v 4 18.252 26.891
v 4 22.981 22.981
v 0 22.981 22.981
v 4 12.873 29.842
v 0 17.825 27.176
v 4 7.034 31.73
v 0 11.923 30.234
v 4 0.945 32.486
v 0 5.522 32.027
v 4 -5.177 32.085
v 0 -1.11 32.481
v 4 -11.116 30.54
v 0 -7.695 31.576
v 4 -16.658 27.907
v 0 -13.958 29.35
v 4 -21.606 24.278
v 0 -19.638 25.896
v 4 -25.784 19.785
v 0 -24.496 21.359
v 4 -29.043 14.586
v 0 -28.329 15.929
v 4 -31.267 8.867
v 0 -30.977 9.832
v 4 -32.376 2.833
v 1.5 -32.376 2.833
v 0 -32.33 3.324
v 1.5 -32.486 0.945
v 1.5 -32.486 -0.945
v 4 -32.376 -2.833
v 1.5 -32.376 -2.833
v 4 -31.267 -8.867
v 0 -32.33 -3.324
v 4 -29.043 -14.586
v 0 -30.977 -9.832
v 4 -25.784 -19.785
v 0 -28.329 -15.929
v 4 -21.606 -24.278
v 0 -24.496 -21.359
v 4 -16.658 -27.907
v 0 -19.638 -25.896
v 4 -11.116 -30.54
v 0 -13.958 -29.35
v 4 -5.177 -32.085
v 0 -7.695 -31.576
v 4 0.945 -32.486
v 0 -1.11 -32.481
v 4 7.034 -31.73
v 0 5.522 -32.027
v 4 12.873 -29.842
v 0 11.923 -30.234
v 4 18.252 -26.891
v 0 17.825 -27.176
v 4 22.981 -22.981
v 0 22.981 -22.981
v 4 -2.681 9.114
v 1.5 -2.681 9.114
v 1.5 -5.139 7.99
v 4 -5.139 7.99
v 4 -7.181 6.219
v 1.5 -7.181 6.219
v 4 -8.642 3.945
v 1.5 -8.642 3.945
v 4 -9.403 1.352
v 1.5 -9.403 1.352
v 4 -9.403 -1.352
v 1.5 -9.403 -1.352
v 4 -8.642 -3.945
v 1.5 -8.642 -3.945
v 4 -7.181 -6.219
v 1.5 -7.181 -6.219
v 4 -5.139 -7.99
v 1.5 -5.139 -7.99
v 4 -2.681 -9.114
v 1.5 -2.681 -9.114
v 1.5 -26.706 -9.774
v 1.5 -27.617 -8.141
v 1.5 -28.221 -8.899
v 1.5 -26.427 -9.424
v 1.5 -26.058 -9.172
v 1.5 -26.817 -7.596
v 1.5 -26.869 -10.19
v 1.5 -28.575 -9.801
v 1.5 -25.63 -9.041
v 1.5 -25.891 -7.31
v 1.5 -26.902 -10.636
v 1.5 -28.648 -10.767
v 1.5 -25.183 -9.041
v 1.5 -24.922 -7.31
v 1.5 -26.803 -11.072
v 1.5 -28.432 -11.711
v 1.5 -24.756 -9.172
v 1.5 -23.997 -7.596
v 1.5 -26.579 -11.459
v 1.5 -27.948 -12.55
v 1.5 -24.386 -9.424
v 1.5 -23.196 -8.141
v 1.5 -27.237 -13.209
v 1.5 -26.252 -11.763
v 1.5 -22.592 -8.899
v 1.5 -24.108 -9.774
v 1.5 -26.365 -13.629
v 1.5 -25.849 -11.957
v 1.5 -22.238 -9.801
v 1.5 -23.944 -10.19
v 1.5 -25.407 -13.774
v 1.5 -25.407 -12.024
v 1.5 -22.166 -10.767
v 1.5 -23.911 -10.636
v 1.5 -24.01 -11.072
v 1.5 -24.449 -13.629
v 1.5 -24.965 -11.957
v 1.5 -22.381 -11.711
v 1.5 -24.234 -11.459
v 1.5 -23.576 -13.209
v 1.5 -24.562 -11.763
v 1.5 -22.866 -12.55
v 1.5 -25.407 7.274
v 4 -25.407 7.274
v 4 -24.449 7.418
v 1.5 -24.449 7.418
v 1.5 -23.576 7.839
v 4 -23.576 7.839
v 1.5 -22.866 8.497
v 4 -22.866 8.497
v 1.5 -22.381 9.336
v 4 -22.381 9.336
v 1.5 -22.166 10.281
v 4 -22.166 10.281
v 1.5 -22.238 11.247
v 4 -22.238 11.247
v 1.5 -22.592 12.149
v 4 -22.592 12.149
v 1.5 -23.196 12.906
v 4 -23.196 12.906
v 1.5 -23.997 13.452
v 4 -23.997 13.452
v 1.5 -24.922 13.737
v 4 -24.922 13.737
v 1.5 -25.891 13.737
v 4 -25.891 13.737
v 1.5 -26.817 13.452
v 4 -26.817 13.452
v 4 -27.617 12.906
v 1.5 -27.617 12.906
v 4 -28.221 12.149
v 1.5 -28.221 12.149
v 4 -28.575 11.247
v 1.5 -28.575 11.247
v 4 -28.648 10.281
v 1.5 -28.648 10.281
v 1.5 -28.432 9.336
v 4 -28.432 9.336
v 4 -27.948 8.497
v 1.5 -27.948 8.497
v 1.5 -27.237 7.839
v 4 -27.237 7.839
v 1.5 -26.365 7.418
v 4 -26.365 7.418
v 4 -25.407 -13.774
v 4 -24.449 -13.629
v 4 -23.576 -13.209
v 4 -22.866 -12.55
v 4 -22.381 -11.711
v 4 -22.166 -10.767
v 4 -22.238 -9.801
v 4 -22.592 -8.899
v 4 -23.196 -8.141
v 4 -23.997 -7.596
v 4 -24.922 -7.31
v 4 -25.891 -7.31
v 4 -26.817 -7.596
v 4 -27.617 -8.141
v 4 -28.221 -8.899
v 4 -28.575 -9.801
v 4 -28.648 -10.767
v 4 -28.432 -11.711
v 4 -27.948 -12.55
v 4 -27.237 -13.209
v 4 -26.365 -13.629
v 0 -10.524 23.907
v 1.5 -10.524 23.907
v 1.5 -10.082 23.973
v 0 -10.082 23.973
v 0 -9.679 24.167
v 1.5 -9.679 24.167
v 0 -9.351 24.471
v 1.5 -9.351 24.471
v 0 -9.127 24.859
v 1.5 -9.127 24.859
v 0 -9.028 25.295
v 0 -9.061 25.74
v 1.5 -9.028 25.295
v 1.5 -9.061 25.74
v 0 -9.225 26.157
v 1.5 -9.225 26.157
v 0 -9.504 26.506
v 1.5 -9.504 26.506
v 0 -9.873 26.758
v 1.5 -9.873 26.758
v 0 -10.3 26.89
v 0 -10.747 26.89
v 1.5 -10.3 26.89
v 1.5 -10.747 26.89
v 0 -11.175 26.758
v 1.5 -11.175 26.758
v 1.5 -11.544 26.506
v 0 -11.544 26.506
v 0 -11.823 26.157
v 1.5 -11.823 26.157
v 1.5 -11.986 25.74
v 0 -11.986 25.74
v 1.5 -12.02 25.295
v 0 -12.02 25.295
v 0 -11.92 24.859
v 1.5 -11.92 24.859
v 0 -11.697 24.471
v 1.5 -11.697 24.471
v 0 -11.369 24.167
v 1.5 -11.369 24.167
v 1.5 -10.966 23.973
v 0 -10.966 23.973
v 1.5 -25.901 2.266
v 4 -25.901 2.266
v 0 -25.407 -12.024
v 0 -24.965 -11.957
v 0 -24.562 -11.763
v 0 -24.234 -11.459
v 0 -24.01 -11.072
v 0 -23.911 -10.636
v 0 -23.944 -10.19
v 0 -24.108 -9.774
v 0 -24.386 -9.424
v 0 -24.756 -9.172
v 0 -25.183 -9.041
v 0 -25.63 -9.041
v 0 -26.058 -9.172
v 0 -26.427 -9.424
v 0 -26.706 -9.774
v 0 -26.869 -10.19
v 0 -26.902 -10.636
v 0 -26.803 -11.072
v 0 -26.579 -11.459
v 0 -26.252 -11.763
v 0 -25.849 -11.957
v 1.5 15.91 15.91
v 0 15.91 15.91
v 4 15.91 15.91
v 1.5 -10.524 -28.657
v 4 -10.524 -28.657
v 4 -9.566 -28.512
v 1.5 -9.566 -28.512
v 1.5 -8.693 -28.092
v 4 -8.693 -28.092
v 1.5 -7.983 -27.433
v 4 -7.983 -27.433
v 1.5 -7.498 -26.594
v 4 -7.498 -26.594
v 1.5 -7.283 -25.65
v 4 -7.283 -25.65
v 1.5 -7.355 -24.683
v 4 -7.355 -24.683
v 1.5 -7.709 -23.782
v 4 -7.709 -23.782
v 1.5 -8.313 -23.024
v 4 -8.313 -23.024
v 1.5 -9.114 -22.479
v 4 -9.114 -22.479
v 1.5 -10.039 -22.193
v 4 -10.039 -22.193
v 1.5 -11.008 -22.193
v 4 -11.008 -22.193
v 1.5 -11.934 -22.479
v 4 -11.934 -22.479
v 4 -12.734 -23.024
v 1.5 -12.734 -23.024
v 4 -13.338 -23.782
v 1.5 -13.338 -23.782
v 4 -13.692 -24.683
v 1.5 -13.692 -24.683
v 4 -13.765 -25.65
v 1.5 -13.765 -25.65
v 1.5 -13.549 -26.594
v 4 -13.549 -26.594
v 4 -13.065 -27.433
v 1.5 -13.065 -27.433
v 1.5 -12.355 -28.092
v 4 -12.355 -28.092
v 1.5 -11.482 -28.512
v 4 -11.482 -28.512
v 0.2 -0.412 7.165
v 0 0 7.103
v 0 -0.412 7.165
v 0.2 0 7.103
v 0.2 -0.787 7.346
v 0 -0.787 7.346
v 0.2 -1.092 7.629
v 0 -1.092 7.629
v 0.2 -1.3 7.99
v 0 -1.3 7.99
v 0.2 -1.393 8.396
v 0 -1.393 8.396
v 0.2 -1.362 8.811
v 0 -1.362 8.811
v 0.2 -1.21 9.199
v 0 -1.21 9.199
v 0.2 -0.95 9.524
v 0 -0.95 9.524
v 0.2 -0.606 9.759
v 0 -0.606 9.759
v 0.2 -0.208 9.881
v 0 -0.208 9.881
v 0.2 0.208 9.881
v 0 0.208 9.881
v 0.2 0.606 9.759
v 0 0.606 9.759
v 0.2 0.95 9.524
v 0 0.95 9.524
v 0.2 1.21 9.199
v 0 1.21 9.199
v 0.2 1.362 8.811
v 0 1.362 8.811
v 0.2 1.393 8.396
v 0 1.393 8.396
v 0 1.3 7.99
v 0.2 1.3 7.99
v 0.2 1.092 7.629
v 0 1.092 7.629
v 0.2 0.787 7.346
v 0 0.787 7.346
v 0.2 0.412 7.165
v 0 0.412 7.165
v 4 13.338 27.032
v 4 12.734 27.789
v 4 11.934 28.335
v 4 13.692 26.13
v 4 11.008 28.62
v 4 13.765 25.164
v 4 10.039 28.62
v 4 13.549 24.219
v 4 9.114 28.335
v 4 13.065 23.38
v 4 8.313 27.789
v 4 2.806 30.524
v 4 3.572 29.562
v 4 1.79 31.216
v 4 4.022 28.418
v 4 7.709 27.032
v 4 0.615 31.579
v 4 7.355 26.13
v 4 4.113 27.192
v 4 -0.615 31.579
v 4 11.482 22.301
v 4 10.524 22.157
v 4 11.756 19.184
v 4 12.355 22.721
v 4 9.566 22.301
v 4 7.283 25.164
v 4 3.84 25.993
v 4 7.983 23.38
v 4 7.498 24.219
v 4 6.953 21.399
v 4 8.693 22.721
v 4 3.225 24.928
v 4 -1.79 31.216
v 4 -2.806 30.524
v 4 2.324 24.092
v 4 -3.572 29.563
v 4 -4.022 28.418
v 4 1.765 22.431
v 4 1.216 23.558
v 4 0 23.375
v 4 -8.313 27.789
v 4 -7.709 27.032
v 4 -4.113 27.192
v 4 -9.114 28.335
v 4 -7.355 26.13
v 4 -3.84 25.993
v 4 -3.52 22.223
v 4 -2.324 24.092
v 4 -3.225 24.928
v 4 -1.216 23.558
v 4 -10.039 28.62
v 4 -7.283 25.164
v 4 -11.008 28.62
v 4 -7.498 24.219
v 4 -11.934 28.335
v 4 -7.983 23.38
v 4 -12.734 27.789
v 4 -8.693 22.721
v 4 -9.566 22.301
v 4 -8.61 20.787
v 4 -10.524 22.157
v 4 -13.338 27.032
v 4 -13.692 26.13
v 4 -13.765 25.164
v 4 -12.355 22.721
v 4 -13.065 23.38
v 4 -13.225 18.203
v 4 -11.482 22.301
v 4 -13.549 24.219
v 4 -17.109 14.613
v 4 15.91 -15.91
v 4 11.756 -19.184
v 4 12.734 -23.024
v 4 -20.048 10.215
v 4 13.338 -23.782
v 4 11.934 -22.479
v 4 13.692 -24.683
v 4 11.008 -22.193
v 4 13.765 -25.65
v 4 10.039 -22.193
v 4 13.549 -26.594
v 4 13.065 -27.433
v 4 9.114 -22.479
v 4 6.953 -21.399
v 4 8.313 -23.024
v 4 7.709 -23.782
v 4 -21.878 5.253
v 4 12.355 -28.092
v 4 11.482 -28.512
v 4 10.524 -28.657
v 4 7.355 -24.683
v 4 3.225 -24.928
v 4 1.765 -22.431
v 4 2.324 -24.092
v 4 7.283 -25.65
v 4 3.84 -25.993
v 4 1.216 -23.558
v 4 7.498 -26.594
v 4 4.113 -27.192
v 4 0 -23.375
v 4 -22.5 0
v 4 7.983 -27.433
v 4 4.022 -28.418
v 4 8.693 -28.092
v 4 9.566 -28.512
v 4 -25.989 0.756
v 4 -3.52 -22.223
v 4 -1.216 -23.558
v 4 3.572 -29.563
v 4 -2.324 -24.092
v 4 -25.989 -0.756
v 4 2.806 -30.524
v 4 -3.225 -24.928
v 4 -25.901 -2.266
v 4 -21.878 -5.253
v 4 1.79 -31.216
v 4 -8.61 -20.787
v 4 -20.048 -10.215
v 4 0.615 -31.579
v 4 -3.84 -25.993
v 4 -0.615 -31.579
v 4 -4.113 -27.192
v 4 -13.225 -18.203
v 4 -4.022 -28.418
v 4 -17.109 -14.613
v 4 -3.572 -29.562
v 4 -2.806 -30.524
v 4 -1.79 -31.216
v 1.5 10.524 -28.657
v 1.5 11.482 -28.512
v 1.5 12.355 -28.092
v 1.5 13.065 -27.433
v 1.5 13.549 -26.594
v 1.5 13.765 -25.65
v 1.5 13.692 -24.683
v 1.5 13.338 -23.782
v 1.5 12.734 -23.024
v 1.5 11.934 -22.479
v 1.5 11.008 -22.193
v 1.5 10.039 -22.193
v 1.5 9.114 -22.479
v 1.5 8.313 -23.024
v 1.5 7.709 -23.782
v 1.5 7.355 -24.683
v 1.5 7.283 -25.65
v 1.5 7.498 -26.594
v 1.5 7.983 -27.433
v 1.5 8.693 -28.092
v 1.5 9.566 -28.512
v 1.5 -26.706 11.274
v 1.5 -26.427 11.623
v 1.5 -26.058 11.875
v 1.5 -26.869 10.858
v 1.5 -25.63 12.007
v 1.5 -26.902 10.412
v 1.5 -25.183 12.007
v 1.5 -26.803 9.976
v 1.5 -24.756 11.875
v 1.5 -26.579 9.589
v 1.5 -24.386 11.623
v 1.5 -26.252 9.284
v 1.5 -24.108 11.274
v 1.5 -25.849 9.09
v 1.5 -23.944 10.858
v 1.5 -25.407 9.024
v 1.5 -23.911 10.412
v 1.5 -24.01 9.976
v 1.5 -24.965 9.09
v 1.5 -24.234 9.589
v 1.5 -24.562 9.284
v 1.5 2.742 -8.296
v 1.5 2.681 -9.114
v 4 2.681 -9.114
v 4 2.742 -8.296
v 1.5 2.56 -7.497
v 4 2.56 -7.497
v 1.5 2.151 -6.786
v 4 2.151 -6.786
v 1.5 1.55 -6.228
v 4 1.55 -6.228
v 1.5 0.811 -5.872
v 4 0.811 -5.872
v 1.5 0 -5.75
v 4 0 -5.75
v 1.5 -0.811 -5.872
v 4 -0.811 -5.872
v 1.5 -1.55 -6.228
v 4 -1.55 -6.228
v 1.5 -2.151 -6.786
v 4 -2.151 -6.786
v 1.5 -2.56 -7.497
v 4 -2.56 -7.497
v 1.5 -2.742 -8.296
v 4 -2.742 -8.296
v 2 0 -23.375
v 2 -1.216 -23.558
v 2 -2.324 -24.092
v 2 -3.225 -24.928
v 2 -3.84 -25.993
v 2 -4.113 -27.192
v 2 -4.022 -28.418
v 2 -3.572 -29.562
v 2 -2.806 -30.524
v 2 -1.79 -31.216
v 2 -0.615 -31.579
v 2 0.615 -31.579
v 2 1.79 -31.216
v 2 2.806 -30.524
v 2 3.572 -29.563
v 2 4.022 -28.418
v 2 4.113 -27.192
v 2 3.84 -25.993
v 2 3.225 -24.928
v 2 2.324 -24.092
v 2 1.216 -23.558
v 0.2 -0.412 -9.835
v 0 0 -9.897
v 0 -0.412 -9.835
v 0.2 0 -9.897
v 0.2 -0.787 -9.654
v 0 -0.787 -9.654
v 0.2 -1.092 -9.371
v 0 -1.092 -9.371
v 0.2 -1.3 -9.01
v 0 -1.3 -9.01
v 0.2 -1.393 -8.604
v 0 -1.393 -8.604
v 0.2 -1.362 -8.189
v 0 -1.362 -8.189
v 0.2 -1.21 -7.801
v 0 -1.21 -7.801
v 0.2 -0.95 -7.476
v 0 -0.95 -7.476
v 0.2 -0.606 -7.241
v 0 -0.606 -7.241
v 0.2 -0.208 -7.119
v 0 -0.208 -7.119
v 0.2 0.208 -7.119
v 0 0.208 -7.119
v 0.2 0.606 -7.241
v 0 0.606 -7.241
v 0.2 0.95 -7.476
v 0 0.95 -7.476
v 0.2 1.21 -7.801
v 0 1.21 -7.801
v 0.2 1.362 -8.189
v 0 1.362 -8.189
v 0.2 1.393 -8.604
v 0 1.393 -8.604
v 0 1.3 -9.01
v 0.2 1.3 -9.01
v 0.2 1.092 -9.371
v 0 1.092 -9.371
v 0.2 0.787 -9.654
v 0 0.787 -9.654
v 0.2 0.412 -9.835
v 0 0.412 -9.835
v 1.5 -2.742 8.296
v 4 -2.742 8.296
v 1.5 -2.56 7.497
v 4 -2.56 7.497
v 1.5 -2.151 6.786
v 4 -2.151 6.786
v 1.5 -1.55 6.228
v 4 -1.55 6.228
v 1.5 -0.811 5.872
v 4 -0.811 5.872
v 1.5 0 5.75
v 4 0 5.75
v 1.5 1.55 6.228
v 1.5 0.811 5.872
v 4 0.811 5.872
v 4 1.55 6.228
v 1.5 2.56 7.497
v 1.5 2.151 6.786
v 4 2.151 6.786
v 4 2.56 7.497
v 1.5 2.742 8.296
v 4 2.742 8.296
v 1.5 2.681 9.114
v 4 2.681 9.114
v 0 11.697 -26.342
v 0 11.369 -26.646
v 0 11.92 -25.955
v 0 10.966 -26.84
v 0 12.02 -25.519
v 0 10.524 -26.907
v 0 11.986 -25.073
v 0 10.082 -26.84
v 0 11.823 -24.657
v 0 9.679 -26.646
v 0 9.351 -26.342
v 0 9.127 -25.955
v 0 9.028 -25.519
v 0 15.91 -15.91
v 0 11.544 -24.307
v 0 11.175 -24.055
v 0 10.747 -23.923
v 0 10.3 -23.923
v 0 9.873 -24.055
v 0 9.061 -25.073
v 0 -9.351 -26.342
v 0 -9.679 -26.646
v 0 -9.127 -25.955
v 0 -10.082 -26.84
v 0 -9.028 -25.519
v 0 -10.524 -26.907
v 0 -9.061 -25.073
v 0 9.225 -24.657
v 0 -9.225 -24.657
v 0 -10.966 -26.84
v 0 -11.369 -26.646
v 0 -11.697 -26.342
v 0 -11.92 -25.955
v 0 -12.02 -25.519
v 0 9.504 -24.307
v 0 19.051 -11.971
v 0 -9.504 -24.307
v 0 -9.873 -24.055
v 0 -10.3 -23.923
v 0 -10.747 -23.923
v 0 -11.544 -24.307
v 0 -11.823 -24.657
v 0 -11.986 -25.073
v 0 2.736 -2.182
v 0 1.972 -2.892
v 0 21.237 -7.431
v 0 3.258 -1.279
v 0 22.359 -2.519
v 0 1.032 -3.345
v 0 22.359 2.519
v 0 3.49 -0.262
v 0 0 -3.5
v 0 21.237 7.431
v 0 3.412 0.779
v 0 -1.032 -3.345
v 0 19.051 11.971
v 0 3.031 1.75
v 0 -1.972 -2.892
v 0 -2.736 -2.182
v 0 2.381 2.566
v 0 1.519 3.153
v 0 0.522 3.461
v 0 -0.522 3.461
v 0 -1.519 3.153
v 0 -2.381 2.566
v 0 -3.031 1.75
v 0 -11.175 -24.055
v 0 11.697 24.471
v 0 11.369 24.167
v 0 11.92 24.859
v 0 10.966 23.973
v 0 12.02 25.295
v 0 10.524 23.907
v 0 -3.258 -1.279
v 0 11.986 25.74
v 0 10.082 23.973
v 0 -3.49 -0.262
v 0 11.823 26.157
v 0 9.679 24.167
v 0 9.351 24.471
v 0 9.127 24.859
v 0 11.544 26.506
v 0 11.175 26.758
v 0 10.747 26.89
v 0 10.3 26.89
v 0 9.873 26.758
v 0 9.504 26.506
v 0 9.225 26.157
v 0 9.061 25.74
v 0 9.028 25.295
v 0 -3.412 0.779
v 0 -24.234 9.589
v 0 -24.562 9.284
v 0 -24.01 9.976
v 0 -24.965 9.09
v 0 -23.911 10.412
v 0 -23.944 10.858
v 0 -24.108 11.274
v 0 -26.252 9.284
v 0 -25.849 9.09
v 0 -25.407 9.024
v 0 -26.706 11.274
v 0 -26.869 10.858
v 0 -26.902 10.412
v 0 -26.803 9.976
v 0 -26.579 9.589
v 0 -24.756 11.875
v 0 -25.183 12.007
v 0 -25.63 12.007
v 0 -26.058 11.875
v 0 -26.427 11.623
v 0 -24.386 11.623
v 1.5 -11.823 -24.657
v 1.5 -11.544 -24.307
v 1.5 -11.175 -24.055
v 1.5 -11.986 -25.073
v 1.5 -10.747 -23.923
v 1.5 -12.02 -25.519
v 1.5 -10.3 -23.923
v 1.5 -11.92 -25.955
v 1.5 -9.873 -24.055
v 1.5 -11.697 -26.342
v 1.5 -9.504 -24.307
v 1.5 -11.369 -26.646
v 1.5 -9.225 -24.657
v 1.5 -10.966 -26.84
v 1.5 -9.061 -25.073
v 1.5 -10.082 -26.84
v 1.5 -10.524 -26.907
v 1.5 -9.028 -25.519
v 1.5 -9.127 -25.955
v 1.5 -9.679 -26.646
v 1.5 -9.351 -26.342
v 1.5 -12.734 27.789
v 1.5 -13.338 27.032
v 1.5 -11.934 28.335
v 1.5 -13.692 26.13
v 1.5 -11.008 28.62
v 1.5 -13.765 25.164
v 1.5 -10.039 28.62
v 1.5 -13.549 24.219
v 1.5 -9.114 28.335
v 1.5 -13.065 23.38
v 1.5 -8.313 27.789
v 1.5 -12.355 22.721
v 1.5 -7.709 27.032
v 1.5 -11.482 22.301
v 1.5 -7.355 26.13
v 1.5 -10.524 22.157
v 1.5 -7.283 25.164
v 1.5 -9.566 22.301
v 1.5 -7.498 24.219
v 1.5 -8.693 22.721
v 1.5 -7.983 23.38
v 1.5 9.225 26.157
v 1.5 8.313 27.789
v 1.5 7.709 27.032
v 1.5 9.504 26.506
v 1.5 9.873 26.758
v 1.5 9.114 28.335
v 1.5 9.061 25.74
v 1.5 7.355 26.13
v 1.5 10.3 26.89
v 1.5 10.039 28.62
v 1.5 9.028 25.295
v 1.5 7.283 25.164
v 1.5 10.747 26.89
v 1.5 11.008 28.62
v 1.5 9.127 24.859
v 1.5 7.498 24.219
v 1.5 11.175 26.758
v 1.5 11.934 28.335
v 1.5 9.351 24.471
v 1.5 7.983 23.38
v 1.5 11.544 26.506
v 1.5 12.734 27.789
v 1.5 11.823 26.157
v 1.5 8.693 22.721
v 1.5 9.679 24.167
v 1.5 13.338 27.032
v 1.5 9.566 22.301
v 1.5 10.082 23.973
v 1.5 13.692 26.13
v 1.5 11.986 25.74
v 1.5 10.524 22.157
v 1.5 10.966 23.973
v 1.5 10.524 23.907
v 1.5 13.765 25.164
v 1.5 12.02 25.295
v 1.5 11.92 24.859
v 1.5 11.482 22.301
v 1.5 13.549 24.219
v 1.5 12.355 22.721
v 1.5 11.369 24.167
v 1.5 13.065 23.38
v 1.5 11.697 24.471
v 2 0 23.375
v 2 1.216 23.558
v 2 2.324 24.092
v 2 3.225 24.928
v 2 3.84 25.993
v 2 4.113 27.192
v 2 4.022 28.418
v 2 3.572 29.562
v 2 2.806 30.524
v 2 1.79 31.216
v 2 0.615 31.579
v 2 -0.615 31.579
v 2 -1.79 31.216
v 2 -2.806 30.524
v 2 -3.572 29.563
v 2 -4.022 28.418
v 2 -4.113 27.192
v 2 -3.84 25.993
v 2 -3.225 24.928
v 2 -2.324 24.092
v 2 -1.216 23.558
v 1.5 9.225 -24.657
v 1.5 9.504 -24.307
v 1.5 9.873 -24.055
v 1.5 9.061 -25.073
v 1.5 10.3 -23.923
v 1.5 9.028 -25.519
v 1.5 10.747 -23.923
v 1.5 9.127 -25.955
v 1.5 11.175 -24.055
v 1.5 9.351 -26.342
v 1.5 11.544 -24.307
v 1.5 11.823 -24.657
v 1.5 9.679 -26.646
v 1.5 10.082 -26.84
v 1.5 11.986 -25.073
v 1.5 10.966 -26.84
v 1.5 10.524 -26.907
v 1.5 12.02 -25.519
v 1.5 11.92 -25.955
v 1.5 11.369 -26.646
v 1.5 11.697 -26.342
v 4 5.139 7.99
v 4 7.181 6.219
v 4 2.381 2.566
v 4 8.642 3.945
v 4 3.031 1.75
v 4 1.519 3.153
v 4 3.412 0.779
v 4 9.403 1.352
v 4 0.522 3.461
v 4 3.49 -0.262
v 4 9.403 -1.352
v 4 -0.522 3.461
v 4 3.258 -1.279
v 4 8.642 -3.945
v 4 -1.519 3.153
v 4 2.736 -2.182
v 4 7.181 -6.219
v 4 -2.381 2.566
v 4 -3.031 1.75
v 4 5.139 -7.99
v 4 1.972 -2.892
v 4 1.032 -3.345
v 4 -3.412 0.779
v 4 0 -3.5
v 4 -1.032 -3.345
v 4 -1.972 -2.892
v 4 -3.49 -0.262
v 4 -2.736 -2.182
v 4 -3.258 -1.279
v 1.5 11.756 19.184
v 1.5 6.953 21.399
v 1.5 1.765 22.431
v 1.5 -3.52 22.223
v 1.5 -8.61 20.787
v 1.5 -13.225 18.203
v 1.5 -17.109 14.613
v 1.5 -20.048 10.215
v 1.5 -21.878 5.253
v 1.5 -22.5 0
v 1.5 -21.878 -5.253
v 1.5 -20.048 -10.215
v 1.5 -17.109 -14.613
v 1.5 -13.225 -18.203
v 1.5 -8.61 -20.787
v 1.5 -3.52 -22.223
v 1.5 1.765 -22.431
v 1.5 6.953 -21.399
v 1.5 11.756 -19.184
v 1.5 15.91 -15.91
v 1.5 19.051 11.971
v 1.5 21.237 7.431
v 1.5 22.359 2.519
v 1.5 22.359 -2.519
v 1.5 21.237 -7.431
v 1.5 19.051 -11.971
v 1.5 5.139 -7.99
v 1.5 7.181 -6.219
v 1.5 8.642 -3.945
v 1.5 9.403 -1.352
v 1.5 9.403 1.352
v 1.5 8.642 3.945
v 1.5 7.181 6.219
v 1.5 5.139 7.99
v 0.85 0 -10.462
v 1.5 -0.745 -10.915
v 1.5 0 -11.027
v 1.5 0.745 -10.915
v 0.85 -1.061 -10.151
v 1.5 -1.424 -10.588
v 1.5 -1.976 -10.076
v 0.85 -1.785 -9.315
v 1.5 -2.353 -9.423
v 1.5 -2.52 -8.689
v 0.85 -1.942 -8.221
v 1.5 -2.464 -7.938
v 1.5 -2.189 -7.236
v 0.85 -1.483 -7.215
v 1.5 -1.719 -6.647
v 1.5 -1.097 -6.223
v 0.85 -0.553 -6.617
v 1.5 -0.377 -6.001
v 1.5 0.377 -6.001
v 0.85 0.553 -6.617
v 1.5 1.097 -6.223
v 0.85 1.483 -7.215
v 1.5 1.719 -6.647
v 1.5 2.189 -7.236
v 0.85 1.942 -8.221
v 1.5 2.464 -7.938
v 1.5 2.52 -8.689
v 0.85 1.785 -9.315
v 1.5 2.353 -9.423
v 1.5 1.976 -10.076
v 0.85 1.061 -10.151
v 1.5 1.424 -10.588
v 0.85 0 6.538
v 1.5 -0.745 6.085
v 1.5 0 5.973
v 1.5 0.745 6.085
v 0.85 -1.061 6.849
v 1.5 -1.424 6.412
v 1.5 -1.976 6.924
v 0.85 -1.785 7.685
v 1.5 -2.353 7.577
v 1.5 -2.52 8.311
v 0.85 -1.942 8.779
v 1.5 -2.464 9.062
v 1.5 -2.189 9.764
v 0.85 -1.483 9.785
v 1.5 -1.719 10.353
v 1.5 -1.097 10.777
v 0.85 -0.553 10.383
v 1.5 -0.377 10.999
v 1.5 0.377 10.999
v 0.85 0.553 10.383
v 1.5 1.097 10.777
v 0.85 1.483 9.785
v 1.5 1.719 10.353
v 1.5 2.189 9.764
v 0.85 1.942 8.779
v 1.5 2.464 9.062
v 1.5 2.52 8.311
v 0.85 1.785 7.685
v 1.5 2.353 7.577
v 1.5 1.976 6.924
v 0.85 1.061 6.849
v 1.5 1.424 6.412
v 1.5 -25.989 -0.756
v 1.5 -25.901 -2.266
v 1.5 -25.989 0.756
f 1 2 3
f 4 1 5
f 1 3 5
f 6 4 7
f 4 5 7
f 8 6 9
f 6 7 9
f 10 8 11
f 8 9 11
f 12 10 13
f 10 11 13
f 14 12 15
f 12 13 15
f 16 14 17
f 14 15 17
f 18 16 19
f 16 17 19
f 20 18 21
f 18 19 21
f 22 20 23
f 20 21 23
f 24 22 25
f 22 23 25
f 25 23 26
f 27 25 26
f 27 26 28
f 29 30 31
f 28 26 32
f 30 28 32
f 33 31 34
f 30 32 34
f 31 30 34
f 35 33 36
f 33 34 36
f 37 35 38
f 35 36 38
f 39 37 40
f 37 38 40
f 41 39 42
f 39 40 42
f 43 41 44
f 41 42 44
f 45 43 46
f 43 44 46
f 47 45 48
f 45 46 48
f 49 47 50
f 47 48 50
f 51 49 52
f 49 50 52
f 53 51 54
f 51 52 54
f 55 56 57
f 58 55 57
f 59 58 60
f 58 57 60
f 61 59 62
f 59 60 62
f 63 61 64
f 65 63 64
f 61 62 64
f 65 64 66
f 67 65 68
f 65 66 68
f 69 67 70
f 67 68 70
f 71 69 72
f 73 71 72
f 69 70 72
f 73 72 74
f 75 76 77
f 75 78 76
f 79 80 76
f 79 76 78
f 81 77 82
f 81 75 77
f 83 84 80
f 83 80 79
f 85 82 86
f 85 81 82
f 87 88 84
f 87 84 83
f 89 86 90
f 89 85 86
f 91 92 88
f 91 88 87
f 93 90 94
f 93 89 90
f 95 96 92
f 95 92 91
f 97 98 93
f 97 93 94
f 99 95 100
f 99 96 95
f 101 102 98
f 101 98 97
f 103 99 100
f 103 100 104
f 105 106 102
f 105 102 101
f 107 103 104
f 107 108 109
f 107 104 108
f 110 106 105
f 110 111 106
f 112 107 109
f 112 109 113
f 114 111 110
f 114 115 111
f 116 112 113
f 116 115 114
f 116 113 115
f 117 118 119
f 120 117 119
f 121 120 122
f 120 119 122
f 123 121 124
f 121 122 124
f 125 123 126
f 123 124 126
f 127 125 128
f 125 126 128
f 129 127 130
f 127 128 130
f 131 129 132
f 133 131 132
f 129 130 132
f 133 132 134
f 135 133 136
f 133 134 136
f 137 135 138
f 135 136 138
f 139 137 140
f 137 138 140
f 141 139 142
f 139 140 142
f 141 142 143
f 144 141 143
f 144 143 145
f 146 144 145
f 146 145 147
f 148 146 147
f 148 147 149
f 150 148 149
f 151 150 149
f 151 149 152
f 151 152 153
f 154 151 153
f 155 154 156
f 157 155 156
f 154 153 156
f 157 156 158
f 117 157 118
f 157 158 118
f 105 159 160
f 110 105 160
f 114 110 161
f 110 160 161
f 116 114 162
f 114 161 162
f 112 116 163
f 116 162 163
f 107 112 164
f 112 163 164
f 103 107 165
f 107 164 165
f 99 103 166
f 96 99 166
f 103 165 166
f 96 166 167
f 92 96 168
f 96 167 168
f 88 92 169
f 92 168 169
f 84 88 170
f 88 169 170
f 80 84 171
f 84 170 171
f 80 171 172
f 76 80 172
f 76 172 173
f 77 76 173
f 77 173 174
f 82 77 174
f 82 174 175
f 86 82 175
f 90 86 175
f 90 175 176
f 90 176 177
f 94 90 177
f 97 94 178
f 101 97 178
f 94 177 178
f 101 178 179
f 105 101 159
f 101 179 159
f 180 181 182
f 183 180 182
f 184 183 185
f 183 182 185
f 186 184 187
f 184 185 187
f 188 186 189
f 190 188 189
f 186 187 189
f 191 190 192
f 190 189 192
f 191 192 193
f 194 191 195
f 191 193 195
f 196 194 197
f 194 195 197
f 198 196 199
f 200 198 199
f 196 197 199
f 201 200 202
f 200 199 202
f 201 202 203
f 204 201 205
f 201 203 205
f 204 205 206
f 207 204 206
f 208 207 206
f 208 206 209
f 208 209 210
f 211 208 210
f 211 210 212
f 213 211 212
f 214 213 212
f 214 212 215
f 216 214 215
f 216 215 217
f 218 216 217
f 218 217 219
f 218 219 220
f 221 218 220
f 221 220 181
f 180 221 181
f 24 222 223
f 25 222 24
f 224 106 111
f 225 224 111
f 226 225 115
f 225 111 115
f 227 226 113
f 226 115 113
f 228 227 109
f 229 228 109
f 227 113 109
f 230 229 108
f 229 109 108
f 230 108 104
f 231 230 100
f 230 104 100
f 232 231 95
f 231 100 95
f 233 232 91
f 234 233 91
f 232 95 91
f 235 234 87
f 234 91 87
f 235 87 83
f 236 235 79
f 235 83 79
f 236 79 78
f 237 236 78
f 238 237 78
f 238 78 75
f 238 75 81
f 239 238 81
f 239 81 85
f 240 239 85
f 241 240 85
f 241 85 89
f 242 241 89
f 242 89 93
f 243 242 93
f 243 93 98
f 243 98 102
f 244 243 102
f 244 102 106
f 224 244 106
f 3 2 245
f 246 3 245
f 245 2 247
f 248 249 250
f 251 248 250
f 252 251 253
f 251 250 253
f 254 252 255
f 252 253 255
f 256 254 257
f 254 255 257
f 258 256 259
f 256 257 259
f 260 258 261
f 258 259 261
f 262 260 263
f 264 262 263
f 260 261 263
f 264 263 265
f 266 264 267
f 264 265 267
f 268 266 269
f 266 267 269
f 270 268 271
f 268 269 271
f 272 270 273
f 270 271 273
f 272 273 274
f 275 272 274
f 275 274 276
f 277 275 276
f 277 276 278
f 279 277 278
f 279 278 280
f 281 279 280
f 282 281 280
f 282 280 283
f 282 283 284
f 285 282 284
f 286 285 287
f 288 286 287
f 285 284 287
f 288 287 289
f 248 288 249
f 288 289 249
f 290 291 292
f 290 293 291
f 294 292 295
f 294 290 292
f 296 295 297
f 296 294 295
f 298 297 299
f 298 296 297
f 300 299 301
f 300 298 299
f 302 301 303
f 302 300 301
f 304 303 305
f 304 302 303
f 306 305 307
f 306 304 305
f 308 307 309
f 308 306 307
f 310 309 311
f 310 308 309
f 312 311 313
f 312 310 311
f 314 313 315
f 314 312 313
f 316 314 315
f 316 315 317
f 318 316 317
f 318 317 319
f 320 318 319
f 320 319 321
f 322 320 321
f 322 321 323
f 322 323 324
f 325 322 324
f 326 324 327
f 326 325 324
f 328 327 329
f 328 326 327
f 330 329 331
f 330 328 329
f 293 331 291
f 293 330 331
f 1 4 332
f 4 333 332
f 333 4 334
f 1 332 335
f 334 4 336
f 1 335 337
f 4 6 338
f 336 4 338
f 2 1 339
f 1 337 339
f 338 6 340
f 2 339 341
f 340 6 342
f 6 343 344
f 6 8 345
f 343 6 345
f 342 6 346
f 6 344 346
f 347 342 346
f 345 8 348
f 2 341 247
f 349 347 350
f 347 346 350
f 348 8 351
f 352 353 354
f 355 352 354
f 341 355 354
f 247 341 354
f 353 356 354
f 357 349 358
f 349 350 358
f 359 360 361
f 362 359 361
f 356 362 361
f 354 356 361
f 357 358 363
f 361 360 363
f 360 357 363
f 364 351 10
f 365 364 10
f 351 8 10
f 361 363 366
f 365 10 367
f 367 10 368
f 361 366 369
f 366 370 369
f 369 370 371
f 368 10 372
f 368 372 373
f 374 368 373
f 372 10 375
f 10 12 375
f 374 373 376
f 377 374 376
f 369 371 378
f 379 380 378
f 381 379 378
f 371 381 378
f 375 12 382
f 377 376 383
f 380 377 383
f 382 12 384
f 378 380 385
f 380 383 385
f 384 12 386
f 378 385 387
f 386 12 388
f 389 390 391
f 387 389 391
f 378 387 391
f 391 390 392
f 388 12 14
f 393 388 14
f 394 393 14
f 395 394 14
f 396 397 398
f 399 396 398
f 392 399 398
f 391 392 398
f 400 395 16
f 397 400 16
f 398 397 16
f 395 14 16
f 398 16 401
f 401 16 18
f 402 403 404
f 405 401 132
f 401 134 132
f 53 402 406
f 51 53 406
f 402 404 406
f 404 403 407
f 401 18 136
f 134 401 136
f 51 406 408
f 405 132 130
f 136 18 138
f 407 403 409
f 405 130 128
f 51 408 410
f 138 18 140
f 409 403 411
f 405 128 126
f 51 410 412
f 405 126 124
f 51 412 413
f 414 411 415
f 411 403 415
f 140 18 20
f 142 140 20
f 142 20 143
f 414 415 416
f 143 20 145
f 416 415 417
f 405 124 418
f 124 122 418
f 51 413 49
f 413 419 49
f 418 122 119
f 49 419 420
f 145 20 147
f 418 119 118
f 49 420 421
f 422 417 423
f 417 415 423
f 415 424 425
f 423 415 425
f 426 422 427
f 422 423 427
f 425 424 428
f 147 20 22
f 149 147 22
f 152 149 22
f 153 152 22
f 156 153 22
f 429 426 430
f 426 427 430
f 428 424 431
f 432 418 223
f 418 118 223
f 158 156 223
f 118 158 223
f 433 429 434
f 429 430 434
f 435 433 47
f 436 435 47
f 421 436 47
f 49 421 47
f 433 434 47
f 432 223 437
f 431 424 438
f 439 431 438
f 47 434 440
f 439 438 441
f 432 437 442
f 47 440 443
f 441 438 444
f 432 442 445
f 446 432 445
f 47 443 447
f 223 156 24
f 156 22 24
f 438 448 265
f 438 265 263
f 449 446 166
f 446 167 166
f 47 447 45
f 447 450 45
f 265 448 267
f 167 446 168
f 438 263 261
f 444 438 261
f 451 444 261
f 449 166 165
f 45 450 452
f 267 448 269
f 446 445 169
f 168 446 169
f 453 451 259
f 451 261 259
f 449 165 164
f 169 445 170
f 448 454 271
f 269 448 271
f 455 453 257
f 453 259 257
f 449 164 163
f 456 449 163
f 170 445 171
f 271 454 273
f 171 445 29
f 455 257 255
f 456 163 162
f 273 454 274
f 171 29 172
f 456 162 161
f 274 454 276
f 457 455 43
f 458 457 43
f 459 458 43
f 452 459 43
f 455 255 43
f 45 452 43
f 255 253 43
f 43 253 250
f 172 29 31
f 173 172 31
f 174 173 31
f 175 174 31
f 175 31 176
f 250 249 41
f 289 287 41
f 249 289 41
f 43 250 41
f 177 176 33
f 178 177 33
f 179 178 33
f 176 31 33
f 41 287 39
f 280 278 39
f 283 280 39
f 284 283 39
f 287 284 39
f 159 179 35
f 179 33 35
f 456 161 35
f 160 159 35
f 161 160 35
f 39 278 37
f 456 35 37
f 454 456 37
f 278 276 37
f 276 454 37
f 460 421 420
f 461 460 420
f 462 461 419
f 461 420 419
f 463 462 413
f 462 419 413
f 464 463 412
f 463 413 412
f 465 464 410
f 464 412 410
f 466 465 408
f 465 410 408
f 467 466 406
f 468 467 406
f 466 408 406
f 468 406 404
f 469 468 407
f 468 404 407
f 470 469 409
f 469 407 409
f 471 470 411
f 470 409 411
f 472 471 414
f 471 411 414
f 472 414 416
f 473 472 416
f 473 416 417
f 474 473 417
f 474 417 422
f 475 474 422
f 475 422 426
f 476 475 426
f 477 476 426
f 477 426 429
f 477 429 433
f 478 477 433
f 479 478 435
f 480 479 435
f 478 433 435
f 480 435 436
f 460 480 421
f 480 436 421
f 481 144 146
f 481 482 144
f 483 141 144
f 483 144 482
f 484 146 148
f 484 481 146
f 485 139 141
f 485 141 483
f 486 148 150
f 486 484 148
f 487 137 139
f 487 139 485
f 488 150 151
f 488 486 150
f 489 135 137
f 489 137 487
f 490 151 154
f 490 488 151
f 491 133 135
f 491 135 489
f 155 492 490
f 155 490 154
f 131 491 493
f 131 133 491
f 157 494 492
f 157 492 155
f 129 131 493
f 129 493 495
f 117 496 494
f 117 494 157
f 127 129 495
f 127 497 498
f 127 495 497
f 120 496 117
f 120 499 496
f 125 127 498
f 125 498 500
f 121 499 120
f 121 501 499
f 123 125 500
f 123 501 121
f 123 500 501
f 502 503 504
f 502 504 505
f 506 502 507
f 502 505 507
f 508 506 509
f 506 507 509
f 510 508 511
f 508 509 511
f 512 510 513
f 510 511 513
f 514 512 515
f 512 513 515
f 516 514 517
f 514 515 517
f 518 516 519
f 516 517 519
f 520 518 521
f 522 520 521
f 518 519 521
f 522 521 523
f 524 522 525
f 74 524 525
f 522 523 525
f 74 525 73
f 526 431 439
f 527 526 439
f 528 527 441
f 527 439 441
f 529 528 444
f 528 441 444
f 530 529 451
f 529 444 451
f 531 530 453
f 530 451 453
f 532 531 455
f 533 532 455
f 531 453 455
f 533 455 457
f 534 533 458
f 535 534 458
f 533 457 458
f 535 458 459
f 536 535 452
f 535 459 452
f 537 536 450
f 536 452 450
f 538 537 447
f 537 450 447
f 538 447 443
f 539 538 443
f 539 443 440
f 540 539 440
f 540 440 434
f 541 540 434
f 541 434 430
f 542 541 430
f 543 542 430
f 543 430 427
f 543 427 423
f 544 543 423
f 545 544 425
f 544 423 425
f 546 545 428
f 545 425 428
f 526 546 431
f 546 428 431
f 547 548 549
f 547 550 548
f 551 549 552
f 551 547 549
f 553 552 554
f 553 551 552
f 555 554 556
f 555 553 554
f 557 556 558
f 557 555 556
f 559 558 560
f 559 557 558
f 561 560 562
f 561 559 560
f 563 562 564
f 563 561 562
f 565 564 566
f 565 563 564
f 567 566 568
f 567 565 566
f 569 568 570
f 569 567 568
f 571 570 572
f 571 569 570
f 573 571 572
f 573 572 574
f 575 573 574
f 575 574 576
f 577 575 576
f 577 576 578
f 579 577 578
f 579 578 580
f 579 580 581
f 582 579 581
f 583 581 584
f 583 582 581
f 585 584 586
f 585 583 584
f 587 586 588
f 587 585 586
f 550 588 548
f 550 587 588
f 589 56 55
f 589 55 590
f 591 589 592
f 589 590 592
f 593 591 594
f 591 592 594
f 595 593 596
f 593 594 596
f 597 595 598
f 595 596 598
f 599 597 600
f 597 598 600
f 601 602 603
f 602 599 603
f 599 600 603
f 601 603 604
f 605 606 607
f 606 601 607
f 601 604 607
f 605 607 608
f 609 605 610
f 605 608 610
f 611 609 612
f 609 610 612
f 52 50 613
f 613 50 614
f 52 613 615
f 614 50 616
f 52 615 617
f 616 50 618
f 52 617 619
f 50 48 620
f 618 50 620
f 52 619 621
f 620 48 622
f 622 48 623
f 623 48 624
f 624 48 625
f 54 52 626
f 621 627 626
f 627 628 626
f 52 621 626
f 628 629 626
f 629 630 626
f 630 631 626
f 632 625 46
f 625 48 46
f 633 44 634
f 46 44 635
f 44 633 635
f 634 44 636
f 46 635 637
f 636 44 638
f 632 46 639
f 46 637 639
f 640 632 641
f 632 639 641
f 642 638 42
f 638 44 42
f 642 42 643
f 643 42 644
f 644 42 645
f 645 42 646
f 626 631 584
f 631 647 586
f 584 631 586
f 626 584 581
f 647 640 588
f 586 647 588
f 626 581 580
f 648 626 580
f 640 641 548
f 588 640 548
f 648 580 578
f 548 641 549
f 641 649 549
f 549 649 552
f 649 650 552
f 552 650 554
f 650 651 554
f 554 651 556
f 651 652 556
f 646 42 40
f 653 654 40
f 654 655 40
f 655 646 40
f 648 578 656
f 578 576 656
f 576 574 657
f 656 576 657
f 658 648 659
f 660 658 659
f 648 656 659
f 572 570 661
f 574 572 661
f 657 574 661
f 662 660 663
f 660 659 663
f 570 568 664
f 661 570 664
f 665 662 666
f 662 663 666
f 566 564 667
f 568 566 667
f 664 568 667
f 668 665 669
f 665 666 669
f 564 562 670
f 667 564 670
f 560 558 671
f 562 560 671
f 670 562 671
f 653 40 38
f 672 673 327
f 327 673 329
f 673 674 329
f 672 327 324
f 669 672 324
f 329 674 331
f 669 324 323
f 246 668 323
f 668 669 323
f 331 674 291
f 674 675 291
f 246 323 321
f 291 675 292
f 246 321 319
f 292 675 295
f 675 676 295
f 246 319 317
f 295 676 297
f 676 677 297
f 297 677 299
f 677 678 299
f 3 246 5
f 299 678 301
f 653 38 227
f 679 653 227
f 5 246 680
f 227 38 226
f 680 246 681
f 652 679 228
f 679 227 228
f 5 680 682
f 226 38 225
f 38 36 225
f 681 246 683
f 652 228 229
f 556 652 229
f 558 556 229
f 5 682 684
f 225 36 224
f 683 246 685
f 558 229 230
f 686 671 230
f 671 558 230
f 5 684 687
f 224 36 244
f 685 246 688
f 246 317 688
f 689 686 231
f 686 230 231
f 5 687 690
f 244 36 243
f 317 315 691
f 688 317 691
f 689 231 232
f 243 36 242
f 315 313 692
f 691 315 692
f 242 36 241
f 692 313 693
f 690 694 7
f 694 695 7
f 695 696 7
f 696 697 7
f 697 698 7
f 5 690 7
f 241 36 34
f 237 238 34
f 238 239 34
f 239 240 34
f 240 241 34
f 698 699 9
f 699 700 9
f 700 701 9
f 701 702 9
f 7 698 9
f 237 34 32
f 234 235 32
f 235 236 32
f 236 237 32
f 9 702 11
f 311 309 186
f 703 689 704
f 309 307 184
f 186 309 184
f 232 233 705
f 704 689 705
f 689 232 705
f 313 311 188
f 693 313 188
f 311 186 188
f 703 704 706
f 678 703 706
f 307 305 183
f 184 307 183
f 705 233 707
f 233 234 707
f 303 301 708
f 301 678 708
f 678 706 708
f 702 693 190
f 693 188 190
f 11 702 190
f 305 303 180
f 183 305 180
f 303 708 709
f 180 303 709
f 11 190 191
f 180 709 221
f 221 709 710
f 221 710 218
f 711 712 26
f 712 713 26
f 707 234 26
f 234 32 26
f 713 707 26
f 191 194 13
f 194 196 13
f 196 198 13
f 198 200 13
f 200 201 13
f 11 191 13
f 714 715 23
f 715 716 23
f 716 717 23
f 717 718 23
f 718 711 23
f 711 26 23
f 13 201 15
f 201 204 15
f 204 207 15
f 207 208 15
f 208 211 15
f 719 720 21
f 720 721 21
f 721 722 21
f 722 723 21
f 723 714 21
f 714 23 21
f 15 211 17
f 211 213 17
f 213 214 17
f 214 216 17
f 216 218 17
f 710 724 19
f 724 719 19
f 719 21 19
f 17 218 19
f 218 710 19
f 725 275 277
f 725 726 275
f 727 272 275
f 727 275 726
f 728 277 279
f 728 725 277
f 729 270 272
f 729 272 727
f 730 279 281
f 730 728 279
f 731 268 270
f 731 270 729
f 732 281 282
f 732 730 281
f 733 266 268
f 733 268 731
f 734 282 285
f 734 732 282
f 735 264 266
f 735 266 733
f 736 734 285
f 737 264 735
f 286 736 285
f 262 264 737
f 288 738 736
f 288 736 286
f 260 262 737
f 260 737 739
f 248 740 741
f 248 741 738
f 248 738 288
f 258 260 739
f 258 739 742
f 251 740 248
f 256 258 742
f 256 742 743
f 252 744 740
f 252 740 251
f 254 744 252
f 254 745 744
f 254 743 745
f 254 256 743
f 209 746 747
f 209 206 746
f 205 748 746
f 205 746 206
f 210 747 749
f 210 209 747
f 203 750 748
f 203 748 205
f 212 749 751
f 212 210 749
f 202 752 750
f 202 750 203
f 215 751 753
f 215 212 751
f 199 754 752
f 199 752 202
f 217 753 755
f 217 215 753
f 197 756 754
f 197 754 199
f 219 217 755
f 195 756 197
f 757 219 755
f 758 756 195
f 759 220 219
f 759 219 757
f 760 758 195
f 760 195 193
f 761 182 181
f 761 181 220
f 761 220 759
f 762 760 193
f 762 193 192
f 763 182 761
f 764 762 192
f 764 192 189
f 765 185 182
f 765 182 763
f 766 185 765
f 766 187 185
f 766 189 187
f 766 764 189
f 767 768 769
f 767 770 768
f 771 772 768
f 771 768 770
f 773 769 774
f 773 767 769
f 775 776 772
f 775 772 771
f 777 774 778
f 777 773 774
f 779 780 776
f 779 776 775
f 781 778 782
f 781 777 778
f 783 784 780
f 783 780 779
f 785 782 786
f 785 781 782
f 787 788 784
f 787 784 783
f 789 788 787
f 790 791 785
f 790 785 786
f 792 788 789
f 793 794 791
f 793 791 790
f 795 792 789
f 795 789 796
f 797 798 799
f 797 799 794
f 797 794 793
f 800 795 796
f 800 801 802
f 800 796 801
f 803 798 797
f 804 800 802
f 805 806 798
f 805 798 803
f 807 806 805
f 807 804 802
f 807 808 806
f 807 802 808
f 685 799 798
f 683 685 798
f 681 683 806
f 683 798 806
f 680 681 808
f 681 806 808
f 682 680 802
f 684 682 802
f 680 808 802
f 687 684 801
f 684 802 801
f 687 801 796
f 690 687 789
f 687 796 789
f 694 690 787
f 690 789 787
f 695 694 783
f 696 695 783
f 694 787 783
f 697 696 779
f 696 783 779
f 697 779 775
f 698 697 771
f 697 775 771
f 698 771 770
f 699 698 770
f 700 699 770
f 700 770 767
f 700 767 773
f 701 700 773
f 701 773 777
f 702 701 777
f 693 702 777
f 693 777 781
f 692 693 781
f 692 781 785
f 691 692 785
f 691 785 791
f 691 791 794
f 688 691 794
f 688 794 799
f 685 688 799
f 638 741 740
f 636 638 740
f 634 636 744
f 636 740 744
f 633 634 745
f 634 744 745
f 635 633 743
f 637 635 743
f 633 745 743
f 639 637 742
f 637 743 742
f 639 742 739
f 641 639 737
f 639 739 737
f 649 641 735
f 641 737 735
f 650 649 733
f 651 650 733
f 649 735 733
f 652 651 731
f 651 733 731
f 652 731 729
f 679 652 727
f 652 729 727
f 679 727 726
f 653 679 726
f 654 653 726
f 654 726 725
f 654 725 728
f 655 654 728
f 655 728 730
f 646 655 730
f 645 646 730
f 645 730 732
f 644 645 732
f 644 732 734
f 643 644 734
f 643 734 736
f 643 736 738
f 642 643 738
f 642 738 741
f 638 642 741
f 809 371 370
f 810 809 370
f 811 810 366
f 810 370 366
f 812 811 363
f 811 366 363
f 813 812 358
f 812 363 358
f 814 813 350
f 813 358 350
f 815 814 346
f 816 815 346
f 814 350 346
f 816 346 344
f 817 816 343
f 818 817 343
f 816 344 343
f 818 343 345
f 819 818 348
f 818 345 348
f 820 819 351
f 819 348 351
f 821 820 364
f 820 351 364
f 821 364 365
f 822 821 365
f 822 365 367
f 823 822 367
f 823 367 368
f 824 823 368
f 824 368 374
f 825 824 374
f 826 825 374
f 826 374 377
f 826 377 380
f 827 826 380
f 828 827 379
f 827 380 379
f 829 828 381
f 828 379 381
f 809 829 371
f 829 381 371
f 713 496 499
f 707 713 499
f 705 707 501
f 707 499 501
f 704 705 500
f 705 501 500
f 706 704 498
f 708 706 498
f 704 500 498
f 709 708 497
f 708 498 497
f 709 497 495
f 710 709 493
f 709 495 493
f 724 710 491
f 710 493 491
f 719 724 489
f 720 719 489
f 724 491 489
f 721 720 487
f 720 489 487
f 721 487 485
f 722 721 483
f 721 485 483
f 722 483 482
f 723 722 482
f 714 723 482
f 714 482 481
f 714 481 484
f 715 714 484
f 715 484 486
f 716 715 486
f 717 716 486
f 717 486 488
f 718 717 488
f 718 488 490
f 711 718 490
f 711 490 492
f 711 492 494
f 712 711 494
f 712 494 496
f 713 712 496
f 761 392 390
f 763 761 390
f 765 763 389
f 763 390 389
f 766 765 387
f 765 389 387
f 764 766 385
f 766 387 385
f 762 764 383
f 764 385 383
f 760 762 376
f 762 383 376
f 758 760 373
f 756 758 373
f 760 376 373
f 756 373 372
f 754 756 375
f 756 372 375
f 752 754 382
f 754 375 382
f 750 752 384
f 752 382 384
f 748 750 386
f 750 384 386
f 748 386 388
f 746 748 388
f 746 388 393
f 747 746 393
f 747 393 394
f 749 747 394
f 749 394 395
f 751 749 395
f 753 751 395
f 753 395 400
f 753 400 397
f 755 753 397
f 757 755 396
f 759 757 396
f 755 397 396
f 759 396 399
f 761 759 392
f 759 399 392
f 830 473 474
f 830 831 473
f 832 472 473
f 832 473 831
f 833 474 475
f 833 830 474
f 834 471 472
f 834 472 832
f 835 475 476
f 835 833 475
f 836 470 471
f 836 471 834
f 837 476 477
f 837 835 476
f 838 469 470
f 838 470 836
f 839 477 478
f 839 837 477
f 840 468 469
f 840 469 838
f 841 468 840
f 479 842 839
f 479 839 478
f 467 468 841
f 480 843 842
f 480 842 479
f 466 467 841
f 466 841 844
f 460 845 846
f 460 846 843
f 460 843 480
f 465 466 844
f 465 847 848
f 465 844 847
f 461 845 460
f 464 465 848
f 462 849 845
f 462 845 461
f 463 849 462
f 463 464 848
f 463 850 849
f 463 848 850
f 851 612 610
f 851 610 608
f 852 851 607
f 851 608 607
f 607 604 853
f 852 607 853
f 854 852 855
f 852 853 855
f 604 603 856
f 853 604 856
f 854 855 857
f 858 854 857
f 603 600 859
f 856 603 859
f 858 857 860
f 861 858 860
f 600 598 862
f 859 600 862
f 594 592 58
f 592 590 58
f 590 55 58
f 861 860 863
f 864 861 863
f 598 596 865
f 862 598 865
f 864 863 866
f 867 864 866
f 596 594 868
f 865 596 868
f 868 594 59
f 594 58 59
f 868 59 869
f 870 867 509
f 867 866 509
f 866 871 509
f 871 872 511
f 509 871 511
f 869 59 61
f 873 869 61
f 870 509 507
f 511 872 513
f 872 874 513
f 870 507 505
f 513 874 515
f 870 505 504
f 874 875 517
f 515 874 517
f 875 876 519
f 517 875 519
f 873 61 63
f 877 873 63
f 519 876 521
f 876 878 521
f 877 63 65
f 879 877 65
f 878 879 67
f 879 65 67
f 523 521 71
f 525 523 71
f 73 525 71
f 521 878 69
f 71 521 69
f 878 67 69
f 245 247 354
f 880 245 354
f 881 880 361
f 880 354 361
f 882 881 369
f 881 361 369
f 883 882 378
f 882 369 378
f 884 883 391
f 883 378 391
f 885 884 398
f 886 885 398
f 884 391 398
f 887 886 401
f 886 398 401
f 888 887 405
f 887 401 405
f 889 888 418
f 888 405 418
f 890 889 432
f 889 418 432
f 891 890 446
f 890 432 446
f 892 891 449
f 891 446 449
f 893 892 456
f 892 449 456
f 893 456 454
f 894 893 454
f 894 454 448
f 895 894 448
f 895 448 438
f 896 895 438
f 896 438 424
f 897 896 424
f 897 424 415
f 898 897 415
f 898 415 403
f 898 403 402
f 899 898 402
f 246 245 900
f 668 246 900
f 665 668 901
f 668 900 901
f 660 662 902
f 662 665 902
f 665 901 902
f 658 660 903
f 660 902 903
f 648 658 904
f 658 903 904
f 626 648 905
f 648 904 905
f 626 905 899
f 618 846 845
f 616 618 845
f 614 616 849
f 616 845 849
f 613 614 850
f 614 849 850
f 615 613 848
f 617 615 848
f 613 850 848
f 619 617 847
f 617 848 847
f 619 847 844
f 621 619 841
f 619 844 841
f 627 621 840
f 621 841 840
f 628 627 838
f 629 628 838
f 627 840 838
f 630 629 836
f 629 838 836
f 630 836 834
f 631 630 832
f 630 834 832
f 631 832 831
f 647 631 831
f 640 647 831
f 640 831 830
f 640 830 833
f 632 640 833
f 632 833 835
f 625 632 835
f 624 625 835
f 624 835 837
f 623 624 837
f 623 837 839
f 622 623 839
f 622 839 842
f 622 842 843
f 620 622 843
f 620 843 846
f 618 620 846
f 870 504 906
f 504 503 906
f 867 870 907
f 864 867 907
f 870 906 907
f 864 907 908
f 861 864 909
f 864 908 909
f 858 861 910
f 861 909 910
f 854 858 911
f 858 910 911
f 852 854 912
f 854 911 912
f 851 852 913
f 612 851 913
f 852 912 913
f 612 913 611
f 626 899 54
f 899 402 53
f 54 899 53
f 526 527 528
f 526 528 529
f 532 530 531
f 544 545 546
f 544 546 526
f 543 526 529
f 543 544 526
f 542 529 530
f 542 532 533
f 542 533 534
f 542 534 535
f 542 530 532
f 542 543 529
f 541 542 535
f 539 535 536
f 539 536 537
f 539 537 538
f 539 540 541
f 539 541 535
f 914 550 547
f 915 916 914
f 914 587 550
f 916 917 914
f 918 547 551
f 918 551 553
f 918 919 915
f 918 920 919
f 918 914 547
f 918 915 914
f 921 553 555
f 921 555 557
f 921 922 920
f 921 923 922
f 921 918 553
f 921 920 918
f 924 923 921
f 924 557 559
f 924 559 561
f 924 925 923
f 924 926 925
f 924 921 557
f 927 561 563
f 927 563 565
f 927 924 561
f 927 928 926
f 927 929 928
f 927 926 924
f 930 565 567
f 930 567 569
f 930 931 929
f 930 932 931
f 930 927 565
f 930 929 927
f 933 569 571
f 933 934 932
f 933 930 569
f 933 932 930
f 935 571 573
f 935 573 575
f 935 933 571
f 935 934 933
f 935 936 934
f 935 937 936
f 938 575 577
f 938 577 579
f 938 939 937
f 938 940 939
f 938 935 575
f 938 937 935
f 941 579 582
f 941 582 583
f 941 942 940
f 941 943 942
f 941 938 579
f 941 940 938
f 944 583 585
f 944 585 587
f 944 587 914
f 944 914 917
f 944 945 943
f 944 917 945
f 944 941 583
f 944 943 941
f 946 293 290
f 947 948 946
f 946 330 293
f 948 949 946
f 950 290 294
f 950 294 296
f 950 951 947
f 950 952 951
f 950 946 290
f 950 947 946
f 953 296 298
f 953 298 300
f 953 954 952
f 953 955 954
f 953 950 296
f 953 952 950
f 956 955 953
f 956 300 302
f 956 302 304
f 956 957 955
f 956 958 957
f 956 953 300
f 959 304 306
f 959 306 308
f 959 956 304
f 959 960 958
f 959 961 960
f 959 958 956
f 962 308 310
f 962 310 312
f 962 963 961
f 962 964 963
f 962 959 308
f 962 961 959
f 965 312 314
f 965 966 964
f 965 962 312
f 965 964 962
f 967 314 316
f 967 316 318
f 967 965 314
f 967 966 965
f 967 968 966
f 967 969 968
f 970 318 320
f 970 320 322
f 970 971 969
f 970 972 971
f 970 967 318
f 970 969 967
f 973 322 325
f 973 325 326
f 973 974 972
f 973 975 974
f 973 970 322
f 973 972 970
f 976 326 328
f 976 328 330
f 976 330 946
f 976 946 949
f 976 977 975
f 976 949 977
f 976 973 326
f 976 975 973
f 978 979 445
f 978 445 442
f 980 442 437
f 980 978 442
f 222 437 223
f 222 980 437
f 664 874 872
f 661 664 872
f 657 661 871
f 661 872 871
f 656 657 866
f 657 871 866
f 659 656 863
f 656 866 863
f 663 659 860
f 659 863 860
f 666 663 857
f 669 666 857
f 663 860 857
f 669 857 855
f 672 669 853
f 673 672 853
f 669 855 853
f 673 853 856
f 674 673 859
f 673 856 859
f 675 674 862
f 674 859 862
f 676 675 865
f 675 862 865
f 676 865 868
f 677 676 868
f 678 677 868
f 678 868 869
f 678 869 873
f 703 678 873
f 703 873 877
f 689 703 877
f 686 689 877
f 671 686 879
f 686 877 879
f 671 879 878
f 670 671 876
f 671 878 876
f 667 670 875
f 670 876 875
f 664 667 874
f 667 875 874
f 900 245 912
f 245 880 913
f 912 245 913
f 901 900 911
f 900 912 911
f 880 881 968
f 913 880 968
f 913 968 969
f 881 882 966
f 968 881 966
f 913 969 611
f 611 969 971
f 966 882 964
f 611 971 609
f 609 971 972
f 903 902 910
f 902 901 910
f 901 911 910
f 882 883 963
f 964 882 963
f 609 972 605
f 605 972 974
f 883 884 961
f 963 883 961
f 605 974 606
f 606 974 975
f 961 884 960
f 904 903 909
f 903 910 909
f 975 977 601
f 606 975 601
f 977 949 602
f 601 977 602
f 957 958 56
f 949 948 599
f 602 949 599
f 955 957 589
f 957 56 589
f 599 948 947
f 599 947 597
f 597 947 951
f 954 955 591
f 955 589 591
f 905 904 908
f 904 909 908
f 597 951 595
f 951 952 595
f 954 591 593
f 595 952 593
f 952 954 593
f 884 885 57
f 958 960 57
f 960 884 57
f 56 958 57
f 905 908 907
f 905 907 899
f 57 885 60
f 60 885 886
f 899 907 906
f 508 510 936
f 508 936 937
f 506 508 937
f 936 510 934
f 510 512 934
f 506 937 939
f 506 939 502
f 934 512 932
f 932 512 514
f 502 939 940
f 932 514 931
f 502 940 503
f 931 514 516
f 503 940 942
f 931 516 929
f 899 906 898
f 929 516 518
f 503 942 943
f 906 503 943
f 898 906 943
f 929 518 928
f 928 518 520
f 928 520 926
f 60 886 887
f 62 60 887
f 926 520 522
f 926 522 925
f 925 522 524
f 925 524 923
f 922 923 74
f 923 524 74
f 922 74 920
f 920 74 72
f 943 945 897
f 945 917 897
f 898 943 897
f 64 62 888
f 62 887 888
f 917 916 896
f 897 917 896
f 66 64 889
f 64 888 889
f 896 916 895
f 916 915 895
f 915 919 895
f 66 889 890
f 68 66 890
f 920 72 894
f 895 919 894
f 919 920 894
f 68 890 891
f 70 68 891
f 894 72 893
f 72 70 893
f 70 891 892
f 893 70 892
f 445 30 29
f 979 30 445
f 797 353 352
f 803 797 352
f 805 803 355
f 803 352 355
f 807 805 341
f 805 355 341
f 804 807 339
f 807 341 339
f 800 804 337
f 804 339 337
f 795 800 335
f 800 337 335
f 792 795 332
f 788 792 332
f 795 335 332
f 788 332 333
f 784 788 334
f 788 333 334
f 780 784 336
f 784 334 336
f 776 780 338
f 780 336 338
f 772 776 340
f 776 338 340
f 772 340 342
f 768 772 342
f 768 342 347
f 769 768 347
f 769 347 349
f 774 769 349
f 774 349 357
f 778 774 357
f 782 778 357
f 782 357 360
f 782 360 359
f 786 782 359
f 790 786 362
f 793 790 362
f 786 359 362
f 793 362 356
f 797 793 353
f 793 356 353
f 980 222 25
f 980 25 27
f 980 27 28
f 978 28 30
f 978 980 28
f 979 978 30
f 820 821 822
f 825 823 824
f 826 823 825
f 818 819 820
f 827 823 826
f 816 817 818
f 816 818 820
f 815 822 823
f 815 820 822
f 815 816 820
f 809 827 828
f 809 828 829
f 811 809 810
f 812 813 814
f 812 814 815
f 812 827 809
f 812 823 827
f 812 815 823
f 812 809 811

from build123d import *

# Parameters (mm, degrees)
CROQUIS2_R                                  = 3.5
CROQUIS2_R_2                                = 1.5
CORTAR_EXTRUIR1_DEPTH                       = 4
CORTAR_EXTRUIR2_DEPTH                       = 10
CORTAR_EXTRUIR3_START                       = -2.5
CORTAR_EXTRUIR3_DEPTH                       = 2.5
CORTAR_EXTRUIR4_DEPTH                       = 2
CROQUIS7_R                                  = 2.75
CROQUIS7_R_2                                = 3.25
CORTAR_EXTRUIR6_DEPTH                       = 2.5
AVELLANADO_PARA_TORNILLO_CON_CABEZA_2_COUNT = 2
AVELLANADO_PARA_TORNILLO_CON_CABEZA_2_PITCH = 17


with BuildPart() as part:
    # Croquis1 → Revolución1 (revolve)
    with BuildSketch(Plane.XY, mode=Mode.PRIVATE) as revoluci_n1_sk:
        Polygon((0, 0), (4, 0), (4, 9.5), (1.5, 9.5), (1.5, 22.5), (4, 22.5), (4, 32.5), (0, 32.5), align=None)
    revolve(revoluci_n1_sk.sketch.rotate(Axis((0, 0, 0), (1, 0, 0)), 90), axis=Axis((0, 0, 0), (1, 0, 0)))

    # Croquis2 → Cortar-Extruir1 (cut)
    with BuildSketch(Plane(origin=(4, 0, 0), x_dir=(0, 0, -1), z_dir=(1, 0, 0))):
        Circle(CROQUIS2_R)
        with Locations((25.406687144, -10.52379439)):
            Circle(CROQUIS2_R_2)
        with Locations((10.52379439, -25.406687144)):
            Circle(CROQUIS2_R_2)
        with Locations((-10.52379439, -25.406687144)):
            Circle(CROQUIS2_R_2)
        with Locations((-25.406687144, -10.52379439)):
            Circle(CROQUIS2_R_2)
        with Locations((-25.406687144, 10.52379439)):
            Circle(CROQUIS2_R_2)
        with Locations((25.406687144, 10.52379439)):
            Circle(CROQUIS2_R_2)
    extrude(amount=-CORTAR_EXTRUIR1_DEPTH, mode=Mode.SUBTRACT)

    # Croquis3 → Cortar-Extruir2 (cut)
    with BuildSketch(Plane(origin=(4, 0, 0), x_dir=(0, 0, -1), z_dir=(1, 0, 0))):
        with BuildLine():
            Line((-22.980970389, 22.980970389), (-15.909902577, 15.909902577))
            ThreePointArc((-15.909902577, 15.909902577), (0, 22.5), (15.909902577, 15.909902577))
            Line((15.909902577, 15.909902577), (22.980970389, 22.980970389))
            ThreePointArc((22.980970389, 22.980970389), (0, 32.5), (-22.980970389, 22.980970389))
        make_face()
    extrude(amount=-CORTAR_EXTRUIR2_DEPTH, mode=Mode.SUBTRACT)

    # Croquis4 → Cortar-Extruir3 (cut)
    with BuildSketch(Plane(origin=(4, 0, 0), x_dir=(0, 0, -1), z_dir=(1, 0, 0)).offset(CORTAR_EXTRUIR3_START)):
        with BuildLine():
            Line((2.832561639, -32.376327688), (2.266049311, -25.90106215))
            ThreePointArc((2.266049311, -25.90106215), (0, -26), (-2.266049311, -25.90106215))
            Line((-2.266049311, -25.90106215), (-2.832561639, -32.376327688))
            ThreePointArc((-2.832561639, -32.376327688), (0, -32.5), (2.832561639, -32.376327688))
        make_face()
    extrude(amount=CORTAR_EXTRUIR3_DEPTH, mode=Mode.SUBTRACT)

    # Croquis5 → Cortar-Extruir4 (cut)
    with BuildSketch(Plane(origin=(4, 0, 0), x_dir=(0, 0, -1), z_dir=(1, 0, 0))):
        with BuildLine():
            ThreePointArc((31.625, 0), (27.5, 4.125), (23.375, 0))
            Line((23.375, 0), (31.625, 0))
        make_face()
        with BuildLine():
            Line((31.625, 0), (23.375, 0))
            ThreePointArc((23.375, 0), (27.5, -4.125), (31.625, 0))
        make_face()
        with BuildLine():
            ThreePointArc((-31.625, 0), (-27.5, -4.125), (-23.375, 0))
            Line((-23.375, 0), (-31.625, 0))
        make_face()
        with BuildLine():
            Line((-31.625, 0), (-23.375, 0))
            ThreePointArc((-23.375, 0), (-27.5, 4.125), (-31.625, 0))
        make_face()
    extrude(amount=-CORTAR_EXTRUIR4_DEPTH, mode=Mode.SUBTRACT)

    # Croquis7 → Cortar-Extruir6 (cut)
    with BuildSketch(Plane(origin=(4, 0, 0), x_dir=(0, 0, -1), z_dir=(1, 0, 0))):
        with Locations((8.5, 0)):
            Circle(CROQUIS7_R)
        with Locations((-8.5, 0)):
            Circle(CROQUIS7_R)
        with Locations((25.406687144, -10.52379439)):
            Circle(CROQUIS7_R_2)
        with Locations((10.52379439, -25.406687144)):
            Circle(CROQUIS7_R_2)
        with Locations((-10.52379439, -25.406687144)):
            Circle(CROQUIS7_R_2)
        with Locations((-25.406687144, -10.52379439)):
            Circle(CROQUIS7_R_2)
        with Locations((-25.406687144, 10.52379439)):
            Circle(CROQUIS7_R_2)
        with Locations((25.406687144, 10.52379439)):
            Circle(CROQUIS7_R_2)
    extrude(amount=-CORTAR_EXTRUIR6_DEPTH, mode=Mode.SUBTRACT)

    # Croquis10 → Avellanado para tornillo con cabeza ovalada de #31 (revolve, cut)
    with BuildSketch(Plane(origin=(1.5, 0, 8.5), x_dir=(0, 0, -1), z_dir=(0, 1, 0))):
        Polygon((0, 0), (0, 1.5), (1.397, 1.5), (1.397, 1.300261411), (2.5273, 0), align=None)
    avellanado_para_tornillo_con_cabeza_oval = revolve(axis=Axis((7.85, 0, 8.5), (-1, 0, 0)), mode=Mode.SUBTRACT)

    # Avellanado para tornillo con cabeza  2: Avellanado para tornillo con cabeza ovalada de #31 ×2
    with Locations(*[(0, 0, -i * AVELLANADO_PARA_TORNILLO_CON_CABEZA_2_PITCH) for i in range(1, AVELLANADO_PARA_TORNILLO_CON_CABEZA_2_COUNT)]):
        add(avellanado_para_tornillo_con_cabeza_oval, mode=Mode.SUBTRACT)


solid = part.part
